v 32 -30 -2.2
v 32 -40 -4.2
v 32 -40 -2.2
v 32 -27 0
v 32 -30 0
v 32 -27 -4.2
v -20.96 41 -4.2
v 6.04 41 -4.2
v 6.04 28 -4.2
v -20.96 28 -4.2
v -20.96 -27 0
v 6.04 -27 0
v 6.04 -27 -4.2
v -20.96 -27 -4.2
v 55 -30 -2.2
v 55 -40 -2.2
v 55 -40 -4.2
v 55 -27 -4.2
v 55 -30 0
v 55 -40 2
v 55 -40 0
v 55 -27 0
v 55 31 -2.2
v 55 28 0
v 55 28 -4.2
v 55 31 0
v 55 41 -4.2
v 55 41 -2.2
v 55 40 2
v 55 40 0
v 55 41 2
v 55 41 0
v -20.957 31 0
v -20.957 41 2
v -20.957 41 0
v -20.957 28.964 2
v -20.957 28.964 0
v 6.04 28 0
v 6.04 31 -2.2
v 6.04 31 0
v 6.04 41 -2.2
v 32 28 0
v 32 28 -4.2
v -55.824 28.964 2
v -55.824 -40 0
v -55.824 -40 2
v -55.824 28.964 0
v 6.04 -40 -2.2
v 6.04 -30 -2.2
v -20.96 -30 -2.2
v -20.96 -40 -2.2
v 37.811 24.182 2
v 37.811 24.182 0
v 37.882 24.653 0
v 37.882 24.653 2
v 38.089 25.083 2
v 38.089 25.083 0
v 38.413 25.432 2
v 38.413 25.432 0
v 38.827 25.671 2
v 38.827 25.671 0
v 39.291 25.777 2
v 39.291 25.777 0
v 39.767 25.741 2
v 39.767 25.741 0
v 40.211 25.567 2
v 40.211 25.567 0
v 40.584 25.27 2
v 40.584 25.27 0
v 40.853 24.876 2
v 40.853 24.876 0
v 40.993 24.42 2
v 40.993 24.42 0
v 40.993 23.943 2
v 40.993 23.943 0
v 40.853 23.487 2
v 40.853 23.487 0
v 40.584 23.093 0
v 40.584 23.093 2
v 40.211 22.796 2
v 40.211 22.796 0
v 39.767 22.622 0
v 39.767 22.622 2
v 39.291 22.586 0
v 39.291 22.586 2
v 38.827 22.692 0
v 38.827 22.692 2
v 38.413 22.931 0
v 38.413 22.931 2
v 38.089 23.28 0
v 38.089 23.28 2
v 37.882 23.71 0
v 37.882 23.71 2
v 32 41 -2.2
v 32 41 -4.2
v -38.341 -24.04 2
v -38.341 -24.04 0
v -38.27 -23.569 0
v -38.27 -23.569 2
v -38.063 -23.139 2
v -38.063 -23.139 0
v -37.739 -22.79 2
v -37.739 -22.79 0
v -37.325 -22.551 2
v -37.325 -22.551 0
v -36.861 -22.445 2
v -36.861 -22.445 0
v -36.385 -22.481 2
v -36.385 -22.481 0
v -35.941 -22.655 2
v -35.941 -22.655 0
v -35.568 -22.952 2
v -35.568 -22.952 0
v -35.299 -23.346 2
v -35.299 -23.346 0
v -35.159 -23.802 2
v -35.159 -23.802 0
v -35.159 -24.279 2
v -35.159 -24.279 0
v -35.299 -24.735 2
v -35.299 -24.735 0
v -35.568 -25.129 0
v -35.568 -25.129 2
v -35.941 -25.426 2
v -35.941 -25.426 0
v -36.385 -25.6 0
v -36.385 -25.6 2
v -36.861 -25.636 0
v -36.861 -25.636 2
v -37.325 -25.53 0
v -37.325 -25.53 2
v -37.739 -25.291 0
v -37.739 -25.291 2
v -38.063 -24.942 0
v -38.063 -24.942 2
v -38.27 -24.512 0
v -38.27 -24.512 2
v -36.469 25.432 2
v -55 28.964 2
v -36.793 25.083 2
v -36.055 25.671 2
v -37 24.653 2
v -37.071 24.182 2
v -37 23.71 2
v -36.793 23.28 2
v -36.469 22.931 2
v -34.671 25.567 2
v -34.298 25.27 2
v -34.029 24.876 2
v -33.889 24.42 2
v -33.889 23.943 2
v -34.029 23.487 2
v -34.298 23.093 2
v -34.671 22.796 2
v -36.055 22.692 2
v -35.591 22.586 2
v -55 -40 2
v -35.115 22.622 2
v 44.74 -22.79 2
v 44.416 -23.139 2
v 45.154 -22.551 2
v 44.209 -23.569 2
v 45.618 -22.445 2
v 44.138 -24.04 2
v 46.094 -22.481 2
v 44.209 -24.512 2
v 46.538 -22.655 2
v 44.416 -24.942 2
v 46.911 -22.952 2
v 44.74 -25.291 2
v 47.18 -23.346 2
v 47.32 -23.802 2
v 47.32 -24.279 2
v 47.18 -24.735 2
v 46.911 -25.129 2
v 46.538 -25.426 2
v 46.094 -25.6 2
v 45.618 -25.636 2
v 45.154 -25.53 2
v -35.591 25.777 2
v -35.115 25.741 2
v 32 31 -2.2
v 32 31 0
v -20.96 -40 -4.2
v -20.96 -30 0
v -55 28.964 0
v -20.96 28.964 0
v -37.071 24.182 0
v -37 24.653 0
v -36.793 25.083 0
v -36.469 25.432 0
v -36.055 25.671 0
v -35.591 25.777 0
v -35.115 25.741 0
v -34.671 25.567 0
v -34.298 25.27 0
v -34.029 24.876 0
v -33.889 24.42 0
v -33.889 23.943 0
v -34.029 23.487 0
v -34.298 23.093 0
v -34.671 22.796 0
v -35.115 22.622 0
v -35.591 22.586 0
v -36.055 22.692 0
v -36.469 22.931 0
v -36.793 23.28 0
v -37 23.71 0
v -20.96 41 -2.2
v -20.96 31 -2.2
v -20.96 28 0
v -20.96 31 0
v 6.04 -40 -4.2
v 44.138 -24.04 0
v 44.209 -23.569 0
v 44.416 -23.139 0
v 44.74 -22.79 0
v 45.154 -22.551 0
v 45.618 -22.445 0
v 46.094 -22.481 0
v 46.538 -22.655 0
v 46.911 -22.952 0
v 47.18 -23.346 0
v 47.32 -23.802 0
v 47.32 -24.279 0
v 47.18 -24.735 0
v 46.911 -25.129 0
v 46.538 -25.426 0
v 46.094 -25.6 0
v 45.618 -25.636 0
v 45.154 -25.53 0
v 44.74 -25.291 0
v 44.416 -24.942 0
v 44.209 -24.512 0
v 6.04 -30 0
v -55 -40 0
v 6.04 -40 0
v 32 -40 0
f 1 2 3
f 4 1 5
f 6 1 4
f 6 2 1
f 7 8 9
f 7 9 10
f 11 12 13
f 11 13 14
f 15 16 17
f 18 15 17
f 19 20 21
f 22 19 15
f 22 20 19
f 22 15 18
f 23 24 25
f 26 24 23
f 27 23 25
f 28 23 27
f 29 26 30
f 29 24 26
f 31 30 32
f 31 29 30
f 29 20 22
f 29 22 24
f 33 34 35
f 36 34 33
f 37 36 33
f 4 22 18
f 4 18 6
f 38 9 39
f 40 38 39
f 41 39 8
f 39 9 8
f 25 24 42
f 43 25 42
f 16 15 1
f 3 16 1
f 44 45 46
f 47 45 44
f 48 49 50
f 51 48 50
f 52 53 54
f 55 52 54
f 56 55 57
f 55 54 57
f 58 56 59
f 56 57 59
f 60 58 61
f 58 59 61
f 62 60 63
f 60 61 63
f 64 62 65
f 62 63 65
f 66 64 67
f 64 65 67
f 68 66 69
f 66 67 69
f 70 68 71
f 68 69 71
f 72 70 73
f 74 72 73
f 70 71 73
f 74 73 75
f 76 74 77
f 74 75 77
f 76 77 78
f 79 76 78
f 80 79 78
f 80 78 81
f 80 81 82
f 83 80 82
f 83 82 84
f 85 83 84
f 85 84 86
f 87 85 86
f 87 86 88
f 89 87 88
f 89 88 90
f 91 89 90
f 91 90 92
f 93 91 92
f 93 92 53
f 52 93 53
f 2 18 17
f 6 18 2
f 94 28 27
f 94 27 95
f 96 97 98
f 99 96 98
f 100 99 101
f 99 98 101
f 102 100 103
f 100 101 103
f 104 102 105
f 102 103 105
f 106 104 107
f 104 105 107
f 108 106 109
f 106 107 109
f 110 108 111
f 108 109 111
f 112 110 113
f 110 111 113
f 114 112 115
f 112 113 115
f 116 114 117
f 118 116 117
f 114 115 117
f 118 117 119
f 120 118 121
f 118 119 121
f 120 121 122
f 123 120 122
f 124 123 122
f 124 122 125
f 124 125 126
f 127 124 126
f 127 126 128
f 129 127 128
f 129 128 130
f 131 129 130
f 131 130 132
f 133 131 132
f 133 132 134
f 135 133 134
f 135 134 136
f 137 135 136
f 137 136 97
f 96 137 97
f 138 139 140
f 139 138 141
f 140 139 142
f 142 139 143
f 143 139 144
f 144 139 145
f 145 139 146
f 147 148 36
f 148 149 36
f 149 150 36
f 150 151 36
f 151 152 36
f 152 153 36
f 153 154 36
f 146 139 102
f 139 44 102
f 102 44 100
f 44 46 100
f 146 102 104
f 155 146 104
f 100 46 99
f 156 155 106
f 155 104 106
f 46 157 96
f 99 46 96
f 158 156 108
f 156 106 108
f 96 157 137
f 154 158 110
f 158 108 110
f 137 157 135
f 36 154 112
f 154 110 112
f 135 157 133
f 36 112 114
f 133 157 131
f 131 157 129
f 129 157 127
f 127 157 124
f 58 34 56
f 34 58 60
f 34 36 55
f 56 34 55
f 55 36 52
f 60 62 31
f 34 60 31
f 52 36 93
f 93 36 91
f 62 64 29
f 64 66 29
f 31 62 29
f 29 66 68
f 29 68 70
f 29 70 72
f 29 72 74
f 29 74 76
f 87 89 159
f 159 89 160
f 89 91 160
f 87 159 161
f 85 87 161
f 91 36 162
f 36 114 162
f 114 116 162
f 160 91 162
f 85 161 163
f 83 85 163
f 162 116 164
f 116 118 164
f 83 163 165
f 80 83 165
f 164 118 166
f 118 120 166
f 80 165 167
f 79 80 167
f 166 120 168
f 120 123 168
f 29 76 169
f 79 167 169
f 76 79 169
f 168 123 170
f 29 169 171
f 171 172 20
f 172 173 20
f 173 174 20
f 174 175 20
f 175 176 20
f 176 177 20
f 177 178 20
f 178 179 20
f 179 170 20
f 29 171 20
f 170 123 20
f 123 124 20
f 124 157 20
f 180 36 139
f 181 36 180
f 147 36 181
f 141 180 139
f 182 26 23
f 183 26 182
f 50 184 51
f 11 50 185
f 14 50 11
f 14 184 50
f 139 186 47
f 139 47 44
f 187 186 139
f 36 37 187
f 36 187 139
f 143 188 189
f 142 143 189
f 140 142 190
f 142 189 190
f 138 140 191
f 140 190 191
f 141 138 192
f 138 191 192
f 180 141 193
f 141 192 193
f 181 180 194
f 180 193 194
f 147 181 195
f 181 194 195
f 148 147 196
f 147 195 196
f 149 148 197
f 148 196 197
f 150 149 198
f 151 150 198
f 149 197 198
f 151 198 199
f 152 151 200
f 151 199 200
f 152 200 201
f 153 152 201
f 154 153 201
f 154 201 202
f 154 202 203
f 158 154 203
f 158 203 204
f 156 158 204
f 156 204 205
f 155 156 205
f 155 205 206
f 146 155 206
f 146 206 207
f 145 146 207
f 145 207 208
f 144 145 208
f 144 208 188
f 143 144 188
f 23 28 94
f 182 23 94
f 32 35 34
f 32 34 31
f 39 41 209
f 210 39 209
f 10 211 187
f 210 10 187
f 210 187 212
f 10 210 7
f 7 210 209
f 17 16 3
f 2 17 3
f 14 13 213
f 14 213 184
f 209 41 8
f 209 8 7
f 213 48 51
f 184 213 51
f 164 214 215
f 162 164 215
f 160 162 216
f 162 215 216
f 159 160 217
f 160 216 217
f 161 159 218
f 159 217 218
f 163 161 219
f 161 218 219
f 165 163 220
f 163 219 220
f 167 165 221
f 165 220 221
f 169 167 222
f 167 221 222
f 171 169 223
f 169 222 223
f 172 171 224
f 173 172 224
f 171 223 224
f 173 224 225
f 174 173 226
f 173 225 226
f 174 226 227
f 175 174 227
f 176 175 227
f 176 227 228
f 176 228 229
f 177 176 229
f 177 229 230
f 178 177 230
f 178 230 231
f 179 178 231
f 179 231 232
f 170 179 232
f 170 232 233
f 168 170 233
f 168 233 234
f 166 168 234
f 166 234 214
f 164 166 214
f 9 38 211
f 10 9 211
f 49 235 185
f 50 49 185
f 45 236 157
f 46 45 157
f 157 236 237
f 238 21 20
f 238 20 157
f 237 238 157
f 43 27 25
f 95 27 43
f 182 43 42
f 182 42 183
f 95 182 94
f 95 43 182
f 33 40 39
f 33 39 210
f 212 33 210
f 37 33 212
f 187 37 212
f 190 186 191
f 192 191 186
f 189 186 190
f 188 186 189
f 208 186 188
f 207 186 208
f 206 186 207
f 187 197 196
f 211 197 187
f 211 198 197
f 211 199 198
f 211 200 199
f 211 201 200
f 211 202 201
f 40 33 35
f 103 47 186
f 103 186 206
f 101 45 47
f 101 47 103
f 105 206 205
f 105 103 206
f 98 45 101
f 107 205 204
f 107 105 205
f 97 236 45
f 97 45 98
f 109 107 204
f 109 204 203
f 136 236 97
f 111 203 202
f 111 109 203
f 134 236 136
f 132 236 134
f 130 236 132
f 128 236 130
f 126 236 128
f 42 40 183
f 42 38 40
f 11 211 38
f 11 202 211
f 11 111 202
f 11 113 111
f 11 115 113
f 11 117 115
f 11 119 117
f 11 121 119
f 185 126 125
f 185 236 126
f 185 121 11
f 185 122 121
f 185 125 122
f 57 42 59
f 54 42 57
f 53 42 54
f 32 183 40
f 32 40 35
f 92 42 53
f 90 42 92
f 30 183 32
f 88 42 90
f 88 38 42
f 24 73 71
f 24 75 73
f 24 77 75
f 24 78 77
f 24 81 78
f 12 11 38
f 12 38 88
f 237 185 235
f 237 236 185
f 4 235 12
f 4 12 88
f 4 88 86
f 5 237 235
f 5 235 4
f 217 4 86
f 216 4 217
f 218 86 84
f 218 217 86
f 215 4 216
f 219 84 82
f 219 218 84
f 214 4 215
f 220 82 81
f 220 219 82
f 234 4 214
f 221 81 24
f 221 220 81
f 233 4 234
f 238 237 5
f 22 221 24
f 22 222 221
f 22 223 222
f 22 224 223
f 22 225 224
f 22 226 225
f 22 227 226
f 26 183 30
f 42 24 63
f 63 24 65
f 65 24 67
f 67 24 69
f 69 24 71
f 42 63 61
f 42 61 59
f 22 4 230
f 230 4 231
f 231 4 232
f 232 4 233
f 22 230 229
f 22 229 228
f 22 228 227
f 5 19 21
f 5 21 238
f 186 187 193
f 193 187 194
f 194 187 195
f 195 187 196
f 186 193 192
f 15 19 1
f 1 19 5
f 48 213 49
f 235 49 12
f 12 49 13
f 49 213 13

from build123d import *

# Parameters (mm, degrees)
SKETCH1_W           = 110
SKETCH1_H           = 80
BOSS_EXTRUDE1_DEPTH = 2
SKETCH2_R           = 1.6
CUT_EXTRUDE1_DEPTH  = 3
SKETCH3_W           = 34.042558981
SKETCH3_H           = 11.036345557
CUT_EXTRUDE2_DEPTH  = 3
SKETCH4_W           = 2
SKETCH4_H           = 68.963654443
BOSS_EXTRUDE2_DEPTH = 3
SKETCH5_W           = 75.957441019
SKETCH5_H           = 2
BOSS_EXTRUDE3_DEPTH = 1
SKETCH6_W           = 113
SKETCH6_H           = 3
BOSS_EXTRUDE4_DEPTH = 2.2
SKETCH7_W           = 113
SKETCH7_H           = 13
BOSS_EXTRUDE6_DEPTH = 2
SKETCH10_W          = 37.04
SKETCH10_H          = 81
CUT_EXTRUDE5_DEPTH  = 3
SKETCH10_2_W        = 37.04
SKETCH10_2_H        = 81
CUT_EXTRUDE6_DEPTH  = 2.2
SKETCH12_W          = 25.96
SKETCH12_H          = 81
CUT_EXTRUDE7_DEPTH  = 4.2
SKETCH13_W          = 4.352914054
SKETCH13_H          = 137.927308885
CUT_EXTRUDE8_DEPTH  = 3


with BuildPart() as part:
    # Sketch1 → Boss-Extrude1 (new body)
    with BuildSketch(Plane.XY):
        Rectangle(SKETCH1_W, SKETCH1_H)
    extrude(amount=BOSS_EXTRUDE1_DEPTH)

    # Sketch2 → Cut-Extrude1 (cut, through all)
    with BuildSketch(Plane(origin=(0, 0, 0), x_dir=(-1, 0, 0), z_dir=(0, 0, -1))):
        with Locations((35.470952311, 24.181556833)):
            Circle(SKETCH2_R)
        with Locations((-39.411047689, 24.181556833)):
            Circle(SKETCH2_R)
        with Locations((-45.738047689, -24.040443167)):
            Circle(SKETCH2_R)
        with Locations((36.740952311, -24.040443167)):
            Circle(SKETCH2_R)
    extrude(amount=-CUT_EXTRUDE1_DEPTH, mode=Mode.SUBTRACT)

    # Sketch3 → Cut-Extrude2 (cut, through all)
    with BuildSketch(Plane.XY.offset(2)):
        with Locations((-37.97872051, 34.481827221)):
            Rectangle(SKETCH3_W, SKETCH3_H)
    extrude(amount=-CUT_EXTRUDE2_DEPTH, mode=Mode.SUBTRACT)

    # Sketch4 → Boss-Extrude2 (add)
    with BuildSketch(Plane.ZY.offset(55)):
        with Locations((1, -5.518172778)):
            Rectangle(SKETCH4_W, SKETCH4_H)
    extrude(amount=BOSS_EXTRUDE2_DEPTH)

    # Sketch5 → Boss-Extrude3 (add)
    with BuildSketch(Plane(origin=(0, 40, 0), x_dir=(1, 0, 0), z_dir=(0, 1, 0))):
        with Locations((17.02127949, -1)):
            Rectangle(SKETCH5_W, SKETCH5_H)
    extrude(amount=BOSS_EXTRUDE3_DEPTH)

    # Sketch6 → Boss-Extrude4 (add)
    with BuildSketch(Plane(origin=(0, 0, 0), x_dir=(-1, 0, 0), z_dir=(0, 0, -1))):
        with Locations((1.5, 29.5)):
            Rectangle(SKETCH6_W, SKETCH6_H)
        with Locations((1.5, -28.5)):
            Rectangle(SKETCH6_W, SKETCH6_H)
    extrude(amount=BOSS_EXTRUDE4_DEPTH)

    # Sketch7 → Boss-Extrude6 (add)
    with BuildSketch(Plane(origin=(0, 0, -2.2), x_dir=(-1, 0, 0), z_dir=(0, 0, -1))):
        with Locations((1.5, 34.5)):
            Rectangle(SKETCH7_W, SKETCH7_H)
        with Locations((1.5, -33.5)):
            Rectangle(SKETCH7_W, SKETCH7_H)
    extrude(amount=BOSS_EXTRUDE6_DEPTH)

    # Sketch10 → Cut-Extrude5 (cut, through all)
    with BuildSketch(Plane.XY.offset(-2.2)):
        with Locations((-39.48, 0.5)):
            Rectangle(SKETCH10_W, SKETCH10_H)
    extrude(amount=-CUT_EXTRUDE5_DEPTH, mode=Mode.SUBTRACT)

    # Sketch10<2> → Cut-Extrude6 (cut)
    with BuildSketch(Plane.XY.offset(-2.2)):
        with Locations((-39.48, 0.5)):
            Rectangle(SKETCH10_2_W, SKETCH10_2_H)
    extrude(amount=CUT_EXTRUDE6_DEPTH, mode=Mode.SUBTRACT)

    # Sketch12 → Cut-Extrude7 (cut)
    with BuildSketch(Plane(origin=(0, 0, -4.2), x_dir=(-1, 0, 0), z_dir=(0, 0, -1))):
        with Locations((-19.02, 0.5)):
            Rectangle(SKETCH12_W, SKETCH12_H)
    extrude(amount=-CUT_EXTRUDE7_DEPTH, mode=Mode.SUBTRACT)

    # Sketch13 → Cut-Extrude8 (cut, through all)
    with BuildSketch(Plane(origin=(0, 0, 0), x_dir=(-1, 0, 0), z_dir=(0, 0, -1))):
        with Locations((58, 28.963654443)):
            Rectangle(SKETCH13_W, SKETCH13_H)
    extrude(amount=-CUT_EXTRUDE8_DEPTH, mode=Mode.SUBTRACT)


solid = part.part
